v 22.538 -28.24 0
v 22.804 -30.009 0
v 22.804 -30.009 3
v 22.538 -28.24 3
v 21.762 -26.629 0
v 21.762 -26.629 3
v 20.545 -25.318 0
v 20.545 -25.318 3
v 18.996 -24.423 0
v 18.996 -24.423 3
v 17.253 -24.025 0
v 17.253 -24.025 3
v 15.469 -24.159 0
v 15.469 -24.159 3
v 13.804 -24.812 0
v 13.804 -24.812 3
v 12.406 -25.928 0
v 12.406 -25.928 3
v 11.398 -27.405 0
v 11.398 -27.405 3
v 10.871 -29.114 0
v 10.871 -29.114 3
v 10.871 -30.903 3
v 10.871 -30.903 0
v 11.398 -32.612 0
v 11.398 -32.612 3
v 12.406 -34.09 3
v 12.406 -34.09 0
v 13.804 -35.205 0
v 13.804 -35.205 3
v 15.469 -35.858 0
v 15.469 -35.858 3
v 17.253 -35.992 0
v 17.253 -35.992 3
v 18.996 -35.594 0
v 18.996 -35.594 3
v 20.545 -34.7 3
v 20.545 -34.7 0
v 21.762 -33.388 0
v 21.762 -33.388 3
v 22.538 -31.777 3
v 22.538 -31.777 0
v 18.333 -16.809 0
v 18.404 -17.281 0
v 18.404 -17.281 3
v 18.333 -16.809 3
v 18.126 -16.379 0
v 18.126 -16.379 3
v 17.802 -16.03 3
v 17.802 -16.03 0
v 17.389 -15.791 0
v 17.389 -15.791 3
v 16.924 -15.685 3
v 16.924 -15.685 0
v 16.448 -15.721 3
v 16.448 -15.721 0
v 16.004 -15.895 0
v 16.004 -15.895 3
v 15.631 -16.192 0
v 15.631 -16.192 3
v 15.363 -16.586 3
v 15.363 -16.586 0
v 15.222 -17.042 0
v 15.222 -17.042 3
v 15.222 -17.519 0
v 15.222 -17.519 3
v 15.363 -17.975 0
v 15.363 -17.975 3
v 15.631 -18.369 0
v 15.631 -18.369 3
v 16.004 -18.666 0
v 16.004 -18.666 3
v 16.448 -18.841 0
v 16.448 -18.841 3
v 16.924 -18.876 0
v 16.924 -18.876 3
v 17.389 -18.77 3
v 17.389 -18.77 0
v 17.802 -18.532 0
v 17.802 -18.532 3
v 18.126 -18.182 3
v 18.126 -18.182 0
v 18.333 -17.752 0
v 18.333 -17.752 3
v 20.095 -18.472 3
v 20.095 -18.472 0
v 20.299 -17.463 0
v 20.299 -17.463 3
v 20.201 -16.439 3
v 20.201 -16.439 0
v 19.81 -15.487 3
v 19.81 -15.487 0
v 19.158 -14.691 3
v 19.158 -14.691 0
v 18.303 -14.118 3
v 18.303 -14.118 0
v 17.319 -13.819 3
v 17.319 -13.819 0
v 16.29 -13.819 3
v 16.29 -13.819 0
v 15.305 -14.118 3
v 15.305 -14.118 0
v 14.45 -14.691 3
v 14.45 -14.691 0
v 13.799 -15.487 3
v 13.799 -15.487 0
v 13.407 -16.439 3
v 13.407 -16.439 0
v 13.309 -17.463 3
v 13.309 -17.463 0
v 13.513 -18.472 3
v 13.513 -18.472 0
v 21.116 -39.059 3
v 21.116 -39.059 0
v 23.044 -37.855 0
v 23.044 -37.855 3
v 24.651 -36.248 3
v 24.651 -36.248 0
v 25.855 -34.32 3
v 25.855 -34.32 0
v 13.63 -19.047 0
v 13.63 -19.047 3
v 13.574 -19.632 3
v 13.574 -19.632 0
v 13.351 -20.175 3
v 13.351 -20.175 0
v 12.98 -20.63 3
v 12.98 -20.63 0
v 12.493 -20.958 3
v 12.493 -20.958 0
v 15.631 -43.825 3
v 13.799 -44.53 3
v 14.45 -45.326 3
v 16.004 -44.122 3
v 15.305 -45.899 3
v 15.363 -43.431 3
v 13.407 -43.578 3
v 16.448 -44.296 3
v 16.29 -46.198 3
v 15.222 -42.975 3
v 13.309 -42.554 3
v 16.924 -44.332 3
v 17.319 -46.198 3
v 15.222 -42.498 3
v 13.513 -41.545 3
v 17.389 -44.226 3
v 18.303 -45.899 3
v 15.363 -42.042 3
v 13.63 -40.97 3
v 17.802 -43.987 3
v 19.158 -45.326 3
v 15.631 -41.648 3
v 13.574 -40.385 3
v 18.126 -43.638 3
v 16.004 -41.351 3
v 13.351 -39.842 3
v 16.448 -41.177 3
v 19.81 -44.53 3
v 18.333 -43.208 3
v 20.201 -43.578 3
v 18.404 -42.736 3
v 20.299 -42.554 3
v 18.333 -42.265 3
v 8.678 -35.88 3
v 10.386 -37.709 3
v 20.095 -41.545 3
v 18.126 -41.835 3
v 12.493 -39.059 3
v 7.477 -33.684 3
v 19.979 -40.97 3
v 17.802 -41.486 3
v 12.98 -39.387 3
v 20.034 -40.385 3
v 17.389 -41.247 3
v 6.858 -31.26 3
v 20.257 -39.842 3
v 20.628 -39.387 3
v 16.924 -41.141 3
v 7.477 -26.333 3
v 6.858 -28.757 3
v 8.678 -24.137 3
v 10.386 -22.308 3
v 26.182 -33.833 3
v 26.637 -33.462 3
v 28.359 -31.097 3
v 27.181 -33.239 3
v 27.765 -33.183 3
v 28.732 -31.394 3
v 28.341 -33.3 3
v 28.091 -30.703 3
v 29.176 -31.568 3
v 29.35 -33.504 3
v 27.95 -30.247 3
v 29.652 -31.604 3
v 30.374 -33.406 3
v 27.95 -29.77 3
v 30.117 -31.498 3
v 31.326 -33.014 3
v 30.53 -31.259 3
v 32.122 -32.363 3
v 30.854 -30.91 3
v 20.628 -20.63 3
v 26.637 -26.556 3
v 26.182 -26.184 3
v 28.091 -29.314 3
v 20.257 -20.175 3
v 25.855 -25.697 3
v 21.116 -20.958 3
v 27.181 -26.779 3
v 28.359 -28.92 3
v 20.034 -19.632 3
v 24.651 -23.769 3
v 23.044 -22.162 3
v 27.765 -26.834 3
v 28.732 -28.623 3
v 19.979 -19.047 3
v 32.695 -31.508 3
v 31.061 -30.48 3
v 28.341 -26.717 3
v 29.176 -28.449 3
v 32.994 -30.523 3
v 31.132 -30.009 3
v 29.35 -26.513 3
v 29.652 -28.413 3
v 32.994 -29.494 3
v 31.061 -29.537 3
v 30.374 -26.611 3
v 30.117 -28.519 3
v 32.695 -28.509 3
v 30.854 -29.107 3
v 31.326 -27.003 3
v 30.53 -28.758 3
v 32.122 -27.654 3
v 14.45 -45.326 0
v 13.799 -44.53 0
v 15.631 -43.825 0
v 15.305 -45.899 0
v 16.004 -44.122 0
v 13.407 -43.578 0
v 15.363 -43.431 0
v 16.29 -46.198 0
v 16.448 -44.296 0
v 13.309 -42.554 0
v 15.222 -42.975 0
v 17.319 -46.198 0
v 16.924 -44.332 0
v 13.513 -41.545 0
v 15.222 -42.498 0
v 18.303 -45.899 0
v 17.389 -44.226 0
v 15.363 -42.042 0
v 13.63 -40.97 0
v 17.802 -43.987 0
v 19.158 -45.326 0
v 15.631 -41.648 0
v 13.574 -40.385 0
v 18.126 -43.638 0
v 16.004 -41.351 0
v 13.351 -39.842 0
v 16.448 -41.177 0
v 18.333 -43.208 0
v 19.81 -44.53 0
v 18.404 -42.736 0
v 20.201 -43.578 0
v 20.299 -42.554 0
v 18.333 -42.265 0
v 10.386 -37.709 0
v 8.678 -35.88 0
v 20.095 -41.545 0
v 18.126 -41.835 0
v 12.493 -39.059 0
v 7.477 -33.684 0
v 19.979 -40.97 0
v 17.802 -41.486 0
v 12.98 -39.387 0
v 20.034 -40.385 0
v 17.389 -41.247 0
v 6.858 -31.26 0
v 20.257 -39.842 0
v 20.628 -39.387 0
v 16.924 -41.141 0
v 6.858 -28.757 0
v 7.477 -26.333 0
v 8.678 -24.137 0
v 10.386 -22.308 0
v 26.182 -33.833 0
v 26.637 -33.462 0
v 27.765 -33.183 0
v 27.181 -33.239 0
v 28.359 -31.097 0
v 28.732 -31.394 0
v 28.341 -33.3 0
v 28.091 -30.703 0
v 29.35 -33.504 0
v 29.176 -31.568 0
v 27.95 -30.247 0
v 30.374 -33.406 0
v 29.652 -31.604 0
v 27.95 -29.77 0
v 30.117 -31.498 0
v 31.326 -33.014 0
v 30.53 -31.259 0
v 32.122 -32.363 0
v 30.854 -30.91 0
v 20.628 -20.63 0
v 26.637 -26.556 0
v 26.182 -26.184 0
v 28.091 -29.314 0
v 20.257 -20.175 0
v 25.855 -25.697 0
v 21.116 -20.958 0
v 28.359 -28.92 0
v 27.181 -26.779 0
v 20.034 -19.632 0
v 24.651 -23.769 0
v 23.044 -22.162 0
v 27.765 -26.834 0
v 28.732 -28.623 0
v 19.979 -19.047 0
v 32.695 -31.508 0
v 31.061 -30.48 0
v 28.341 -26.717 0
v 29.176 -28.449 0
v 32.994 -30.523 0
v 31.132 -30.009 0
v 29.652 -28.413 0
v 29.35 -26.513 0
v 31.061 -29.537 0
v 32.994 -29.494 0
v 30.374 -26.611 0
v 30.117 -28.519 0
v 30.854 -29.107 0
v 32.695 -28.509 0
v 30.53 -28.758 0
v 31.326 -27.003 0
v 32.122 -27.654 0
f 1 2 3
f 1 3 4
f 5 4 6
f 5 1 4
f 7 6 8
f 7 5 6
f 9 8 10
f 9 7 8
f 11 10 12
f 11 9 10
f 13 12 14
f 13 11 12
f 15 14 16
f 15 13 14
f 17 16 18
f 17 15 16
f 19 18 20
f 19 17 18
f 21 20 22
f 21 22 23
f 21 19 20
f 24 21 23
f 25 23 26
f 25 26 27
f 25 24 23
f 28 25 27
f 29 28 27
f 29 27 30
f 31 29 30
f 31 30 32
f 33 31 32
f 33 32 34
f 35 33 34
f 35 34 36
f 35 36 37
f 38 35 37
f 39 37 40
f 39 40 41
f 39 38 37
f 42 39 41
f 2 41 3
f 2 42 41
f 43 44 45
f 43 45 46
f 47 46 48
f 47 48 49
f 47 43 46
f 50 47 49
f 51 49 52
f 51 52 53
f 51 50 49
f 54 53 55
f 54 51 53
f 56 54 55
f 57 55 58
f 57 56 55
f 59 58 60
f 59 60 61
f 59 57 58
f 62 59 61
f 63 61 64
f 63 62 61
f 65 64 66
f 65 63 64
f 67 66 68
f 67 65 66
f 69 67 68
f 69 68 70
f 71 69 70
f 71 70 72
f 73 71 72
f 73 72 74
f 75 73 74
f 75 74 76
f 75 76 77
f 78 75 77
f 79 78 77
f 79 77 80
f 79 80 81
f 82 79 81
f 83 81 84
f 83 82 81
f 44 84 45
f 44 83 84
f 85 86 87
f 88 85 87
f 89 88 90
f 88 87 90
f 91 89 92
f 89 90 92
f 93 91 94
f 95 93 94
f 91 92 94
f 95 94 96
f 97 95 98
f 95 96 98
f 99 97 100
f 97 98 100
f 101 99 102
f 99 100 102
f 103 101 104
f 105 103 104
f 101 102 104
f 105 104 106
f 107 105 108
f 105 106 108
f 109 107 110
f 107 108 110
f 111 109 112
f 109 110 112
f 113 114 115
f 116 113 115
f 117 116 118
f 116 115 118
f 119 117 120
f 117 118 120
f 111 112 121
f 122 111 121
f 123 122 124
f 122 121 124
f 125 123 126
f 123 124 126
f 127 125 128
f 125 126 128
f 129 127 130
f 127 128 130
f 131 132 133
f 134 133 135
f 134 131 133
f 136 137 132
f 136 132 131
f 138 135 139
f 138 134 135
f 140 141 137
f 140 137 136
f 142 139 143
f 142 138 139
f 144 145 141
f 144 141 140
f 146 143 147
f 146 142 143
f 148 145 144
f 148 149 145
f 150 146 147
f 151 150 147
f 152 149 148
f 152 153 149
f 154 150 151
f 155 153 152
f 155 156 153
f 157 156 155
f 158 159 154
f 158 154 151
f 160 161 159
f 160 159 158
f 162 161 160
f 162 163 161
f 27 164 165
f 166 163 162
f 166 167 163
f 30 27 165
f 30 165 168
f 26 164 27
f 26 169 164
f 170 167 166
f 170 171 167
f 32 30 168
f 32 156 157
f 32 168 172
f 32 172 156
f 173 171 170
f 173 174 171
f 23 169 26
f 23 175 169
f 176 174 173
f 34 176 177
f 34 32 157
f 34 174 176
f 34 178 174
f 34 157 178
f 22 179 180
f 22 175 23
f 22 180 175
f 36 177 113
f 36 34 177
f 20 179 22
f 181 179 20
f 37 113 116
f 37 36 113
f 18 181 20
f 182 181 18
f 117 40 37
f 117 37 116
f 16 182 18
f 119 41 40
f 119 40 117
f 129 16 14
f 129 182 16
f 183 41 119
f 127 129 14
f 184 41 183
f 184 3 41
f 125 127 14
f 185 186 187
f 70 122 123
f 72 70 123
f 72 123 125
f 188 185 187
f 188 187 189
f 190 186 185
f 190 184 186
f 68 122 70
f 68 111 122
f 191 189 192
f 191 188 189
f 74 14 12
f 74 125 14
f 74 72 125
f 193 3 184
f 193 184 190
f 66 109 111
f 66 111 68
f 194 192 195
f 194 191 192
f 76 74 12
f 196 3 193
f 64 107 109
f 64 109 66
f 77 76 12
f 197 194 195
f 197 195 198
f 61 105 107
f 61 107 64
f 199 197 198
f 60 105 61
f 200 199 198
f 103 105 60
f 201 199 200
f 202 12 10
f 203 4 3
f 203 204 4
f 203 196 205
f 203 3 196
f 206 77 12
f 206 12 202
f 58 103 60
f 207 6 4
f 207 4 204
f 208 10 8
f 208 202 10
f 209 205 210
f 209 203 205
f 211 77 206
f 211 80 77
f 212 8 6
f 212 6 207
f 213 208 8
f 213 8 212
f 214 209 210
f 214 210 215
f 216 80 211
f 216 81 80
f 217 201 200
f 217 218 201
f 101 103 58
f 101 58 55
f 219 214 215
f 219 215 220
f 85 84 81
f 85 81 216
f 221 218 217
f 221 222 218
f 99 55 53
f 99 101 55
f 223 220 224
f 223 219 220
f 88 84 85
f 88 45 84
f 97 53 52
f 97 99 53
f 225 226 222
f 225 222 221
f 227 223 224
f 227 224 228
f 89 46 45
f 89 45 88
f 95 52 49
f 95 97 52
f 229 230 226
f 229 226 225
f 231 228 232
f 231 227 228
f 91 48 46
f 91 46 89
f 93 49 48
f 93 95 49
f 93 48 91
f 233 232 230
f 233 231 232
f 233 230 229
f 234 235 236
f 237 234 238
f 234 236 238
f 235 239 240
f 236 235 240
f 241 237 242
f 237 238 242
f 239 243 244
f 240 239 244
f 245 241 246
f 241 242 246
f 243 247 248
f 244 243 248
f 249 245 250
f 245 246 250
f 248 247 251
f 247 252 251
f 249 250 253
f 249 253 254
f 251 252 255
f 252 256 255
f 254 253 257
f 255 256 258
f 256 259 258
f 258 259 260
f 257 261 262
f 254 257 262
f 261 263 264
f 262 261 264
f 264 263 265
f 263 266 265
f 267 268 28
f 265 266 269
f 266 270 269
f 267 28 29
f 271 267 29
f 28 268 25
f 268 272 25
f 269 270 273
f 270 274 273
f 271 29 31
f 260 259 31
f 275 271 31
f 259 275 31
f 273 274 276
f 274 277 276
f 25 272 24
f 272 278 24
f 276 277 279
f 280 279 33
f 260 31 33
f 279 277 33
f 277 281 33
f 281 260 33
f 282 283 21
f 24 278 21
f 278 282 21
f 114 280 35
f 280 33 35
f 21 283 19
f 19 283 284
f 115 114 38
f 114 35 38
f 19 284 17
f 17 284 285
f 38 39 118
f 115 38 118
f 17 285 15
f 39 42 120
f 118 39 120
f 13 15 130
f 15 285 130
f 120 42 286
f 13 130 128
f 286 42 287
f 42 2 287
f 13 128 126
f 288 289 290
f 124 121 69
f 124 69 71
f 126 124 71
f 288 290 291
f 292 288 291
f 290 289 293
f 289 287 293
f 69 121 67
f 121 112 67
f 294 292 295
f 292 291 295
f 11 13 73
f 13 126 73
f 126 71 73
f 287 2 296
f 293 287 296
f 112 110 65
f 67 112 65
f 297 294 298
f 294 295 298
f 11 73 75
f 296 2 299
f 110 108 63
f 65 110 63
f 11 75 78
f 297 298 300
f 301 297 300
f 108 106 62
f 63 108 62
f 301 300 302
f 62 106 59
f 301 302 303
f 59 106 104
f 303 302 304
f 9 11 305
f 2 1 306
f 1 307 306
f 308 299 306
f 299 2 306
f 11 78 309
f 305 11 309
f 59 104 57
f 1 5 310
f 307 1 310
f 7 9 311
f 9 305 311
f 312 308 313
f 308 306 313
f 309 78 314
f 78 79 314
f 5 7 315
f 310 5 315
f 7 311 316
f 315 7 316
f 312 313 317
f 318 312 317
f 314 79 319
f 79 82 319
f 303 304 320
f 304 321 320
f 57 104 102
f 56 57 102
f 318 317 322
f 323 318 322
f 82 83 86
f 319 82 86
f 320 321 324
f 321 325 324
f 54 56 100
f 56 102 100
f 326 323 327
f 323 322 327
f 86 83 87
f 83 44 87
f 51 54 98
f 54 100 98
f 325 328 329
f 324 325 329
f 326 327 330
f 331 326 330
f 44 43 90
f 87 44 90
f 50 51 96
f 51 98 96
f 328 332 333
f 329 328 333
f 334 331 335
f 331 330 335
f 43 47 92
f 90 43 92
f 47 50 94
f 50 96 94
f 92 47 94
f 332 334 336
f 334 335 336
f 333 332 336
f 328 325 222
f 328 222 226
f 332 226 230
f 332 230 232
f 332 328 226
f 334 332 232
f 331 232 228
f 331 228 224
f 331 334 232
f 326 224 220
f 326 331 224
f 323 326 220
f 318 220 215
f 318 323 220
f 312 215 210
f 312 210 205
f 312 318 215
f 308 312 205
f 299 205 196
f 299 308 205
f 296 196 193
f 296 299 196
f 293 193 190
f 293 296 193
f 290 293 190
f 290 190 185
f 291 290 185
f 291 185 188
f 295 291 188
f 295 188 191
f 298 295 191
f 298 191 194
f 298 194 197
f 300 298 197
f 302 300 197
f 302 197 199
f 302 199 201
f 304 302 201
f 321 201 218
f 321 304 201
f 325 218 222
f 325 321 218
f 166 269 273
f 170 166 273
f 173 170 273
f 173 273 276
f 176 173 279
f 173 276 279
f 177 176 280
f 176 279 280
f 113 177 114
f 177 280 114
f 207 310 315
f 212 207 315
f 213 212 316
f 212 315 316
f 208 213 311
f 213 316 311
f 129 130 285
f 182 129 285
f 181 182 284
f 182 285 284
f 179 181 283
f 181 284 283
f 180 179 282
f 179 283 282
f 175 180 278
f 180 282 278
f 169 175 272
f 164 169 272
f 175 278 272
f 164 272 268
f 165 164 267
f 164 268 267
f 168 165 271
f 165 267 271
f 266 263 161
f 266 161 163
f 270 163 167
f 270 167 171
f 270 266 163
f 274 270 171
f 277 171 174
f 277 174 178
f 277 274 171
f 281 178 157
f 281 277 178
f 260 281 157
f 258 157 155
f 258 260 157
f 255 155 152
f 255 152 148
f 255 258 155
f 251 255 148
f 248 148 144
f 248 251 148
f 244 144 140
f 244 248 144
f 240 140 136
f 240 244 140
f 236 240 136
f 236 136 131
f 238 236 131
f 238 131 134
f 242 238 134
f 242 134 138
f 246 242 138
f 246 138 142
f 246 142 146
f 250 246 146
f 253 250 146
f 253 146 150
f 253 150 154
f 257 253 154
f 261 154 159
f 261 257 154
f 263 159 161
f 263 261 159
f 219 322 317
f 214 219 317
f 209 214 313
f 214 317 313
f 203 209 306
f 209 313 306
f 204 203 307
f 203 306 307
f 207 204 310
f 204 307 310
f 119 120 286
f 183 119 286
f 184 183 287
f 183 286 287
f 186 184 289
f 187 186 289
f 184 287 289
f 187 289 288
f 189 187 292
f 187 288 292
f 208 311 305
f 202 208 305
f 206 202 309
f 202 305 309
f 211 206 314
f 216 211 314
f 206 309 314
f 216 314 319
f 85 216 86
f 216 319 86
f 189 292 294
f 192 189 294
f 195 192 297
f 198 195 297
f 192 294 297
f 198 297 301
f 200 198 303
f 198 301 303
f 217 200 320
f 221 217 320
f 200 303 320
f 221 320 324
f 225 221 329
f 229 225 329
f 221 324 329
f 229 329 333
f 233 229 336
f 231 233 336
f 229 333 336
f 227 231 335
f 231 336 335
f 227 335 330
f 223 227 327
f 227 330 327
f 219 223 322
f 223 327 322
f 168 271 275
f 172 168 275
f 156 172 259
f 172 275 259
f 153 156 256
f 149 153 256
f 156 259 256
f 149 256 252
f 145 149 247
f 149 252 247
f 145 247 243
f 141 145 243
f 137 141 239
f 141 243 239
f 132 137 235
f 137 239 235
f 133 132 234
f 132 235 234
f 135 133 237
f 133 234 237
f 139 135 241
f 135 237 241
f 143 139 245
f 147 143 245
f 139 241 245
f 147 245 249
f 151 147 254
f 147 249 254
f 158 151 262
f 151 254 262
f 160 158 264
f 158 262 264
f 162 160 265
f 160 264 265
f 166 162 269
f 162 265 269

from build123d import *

# Parameters (mm, degrees)
SKETCH1_R           = 1.6
SKETCH1_R_2         = 6
BOSS_EXTRUDE1_DEPTH = 3


with BuildPart() as part:
    # Sketch1 → Boss-Extrude1 (new body)
    with BuildSketch(Plane.XY):
        with BuildLine():
            ThreePointArc((13.513146708, -41.545306592), (16.804211194, -46.236480195), (20.095275679, -41.545306592))
            ThreePointArc((20.095275679, -41.545306592), (20.125665024, -40.105234948), (21.115730483, -39.059051292))
            ThreePointArc((21.115730483, -39.059051292), (23.892956675, -37.097303615), (25.854704352, -34.320077422))
            ThreePointArc((25.854704352, -34.320077422), (26.900888008, -33.330011964), (28.340959652, -33.299622619))
            ThreePointArc((28.340959652, -33.299622619), (33.032133255, -30.008558133), (28.340959652, -26.717493648))
            ThreePointArc((28.340959652, -26.717493648), (26.900888008, -26.687104303), (25.854704352, -25.697038844))
            ThreePointArc((25.854704352, -25.697038844), (23.892956675, -22.919812652), (21.115730483, -20.958064974))
            ThreePointArc((21.115730483, -20.958064974), (20.125665024, -19.911881319), (20.095275679, -18.471809674))
            ThreePointArc((20.095275679, -18.471809674), (16.804211194, -13.780636072), (13.513146708, -18.471809674))
            ThreePointArc((13.513146708, -18.471809674), (13.482757363, -19.911881319), (12.492691904, -20.958064974))
            ThreePointArc((12.492691904, -20.958064974), (6.779211194, -30.008558133), (12.492691904, -39.059051292))
            ThreePointArc((12.492691904, -39.059051292), (13.482757363, -40.105234948), (13.513146708, -41.545306592))
        make_face()
        with Locations((16.804211194, -17.280636072)):
            Circle(SKETCH1_R, mode=Mode.SUBTRACT)
        with Locations((16.804211194, -30.008558133)):
            Circle(SKETCH1_R_2, mode=Mode.SUBTRACT)
        with Locations((16.804211194, -42.736480195)):
            Circle(SKETCH1_R, mode=Mode.SUBTRACT)
        with Locations((29.532133255, -30.008558133)):
            Circle(SKETCH1_R, mode=Mode.SUBTRACT)
    extrude(amount=BOSS_EXTRUDE1_DEPTH)


solid = part.part
